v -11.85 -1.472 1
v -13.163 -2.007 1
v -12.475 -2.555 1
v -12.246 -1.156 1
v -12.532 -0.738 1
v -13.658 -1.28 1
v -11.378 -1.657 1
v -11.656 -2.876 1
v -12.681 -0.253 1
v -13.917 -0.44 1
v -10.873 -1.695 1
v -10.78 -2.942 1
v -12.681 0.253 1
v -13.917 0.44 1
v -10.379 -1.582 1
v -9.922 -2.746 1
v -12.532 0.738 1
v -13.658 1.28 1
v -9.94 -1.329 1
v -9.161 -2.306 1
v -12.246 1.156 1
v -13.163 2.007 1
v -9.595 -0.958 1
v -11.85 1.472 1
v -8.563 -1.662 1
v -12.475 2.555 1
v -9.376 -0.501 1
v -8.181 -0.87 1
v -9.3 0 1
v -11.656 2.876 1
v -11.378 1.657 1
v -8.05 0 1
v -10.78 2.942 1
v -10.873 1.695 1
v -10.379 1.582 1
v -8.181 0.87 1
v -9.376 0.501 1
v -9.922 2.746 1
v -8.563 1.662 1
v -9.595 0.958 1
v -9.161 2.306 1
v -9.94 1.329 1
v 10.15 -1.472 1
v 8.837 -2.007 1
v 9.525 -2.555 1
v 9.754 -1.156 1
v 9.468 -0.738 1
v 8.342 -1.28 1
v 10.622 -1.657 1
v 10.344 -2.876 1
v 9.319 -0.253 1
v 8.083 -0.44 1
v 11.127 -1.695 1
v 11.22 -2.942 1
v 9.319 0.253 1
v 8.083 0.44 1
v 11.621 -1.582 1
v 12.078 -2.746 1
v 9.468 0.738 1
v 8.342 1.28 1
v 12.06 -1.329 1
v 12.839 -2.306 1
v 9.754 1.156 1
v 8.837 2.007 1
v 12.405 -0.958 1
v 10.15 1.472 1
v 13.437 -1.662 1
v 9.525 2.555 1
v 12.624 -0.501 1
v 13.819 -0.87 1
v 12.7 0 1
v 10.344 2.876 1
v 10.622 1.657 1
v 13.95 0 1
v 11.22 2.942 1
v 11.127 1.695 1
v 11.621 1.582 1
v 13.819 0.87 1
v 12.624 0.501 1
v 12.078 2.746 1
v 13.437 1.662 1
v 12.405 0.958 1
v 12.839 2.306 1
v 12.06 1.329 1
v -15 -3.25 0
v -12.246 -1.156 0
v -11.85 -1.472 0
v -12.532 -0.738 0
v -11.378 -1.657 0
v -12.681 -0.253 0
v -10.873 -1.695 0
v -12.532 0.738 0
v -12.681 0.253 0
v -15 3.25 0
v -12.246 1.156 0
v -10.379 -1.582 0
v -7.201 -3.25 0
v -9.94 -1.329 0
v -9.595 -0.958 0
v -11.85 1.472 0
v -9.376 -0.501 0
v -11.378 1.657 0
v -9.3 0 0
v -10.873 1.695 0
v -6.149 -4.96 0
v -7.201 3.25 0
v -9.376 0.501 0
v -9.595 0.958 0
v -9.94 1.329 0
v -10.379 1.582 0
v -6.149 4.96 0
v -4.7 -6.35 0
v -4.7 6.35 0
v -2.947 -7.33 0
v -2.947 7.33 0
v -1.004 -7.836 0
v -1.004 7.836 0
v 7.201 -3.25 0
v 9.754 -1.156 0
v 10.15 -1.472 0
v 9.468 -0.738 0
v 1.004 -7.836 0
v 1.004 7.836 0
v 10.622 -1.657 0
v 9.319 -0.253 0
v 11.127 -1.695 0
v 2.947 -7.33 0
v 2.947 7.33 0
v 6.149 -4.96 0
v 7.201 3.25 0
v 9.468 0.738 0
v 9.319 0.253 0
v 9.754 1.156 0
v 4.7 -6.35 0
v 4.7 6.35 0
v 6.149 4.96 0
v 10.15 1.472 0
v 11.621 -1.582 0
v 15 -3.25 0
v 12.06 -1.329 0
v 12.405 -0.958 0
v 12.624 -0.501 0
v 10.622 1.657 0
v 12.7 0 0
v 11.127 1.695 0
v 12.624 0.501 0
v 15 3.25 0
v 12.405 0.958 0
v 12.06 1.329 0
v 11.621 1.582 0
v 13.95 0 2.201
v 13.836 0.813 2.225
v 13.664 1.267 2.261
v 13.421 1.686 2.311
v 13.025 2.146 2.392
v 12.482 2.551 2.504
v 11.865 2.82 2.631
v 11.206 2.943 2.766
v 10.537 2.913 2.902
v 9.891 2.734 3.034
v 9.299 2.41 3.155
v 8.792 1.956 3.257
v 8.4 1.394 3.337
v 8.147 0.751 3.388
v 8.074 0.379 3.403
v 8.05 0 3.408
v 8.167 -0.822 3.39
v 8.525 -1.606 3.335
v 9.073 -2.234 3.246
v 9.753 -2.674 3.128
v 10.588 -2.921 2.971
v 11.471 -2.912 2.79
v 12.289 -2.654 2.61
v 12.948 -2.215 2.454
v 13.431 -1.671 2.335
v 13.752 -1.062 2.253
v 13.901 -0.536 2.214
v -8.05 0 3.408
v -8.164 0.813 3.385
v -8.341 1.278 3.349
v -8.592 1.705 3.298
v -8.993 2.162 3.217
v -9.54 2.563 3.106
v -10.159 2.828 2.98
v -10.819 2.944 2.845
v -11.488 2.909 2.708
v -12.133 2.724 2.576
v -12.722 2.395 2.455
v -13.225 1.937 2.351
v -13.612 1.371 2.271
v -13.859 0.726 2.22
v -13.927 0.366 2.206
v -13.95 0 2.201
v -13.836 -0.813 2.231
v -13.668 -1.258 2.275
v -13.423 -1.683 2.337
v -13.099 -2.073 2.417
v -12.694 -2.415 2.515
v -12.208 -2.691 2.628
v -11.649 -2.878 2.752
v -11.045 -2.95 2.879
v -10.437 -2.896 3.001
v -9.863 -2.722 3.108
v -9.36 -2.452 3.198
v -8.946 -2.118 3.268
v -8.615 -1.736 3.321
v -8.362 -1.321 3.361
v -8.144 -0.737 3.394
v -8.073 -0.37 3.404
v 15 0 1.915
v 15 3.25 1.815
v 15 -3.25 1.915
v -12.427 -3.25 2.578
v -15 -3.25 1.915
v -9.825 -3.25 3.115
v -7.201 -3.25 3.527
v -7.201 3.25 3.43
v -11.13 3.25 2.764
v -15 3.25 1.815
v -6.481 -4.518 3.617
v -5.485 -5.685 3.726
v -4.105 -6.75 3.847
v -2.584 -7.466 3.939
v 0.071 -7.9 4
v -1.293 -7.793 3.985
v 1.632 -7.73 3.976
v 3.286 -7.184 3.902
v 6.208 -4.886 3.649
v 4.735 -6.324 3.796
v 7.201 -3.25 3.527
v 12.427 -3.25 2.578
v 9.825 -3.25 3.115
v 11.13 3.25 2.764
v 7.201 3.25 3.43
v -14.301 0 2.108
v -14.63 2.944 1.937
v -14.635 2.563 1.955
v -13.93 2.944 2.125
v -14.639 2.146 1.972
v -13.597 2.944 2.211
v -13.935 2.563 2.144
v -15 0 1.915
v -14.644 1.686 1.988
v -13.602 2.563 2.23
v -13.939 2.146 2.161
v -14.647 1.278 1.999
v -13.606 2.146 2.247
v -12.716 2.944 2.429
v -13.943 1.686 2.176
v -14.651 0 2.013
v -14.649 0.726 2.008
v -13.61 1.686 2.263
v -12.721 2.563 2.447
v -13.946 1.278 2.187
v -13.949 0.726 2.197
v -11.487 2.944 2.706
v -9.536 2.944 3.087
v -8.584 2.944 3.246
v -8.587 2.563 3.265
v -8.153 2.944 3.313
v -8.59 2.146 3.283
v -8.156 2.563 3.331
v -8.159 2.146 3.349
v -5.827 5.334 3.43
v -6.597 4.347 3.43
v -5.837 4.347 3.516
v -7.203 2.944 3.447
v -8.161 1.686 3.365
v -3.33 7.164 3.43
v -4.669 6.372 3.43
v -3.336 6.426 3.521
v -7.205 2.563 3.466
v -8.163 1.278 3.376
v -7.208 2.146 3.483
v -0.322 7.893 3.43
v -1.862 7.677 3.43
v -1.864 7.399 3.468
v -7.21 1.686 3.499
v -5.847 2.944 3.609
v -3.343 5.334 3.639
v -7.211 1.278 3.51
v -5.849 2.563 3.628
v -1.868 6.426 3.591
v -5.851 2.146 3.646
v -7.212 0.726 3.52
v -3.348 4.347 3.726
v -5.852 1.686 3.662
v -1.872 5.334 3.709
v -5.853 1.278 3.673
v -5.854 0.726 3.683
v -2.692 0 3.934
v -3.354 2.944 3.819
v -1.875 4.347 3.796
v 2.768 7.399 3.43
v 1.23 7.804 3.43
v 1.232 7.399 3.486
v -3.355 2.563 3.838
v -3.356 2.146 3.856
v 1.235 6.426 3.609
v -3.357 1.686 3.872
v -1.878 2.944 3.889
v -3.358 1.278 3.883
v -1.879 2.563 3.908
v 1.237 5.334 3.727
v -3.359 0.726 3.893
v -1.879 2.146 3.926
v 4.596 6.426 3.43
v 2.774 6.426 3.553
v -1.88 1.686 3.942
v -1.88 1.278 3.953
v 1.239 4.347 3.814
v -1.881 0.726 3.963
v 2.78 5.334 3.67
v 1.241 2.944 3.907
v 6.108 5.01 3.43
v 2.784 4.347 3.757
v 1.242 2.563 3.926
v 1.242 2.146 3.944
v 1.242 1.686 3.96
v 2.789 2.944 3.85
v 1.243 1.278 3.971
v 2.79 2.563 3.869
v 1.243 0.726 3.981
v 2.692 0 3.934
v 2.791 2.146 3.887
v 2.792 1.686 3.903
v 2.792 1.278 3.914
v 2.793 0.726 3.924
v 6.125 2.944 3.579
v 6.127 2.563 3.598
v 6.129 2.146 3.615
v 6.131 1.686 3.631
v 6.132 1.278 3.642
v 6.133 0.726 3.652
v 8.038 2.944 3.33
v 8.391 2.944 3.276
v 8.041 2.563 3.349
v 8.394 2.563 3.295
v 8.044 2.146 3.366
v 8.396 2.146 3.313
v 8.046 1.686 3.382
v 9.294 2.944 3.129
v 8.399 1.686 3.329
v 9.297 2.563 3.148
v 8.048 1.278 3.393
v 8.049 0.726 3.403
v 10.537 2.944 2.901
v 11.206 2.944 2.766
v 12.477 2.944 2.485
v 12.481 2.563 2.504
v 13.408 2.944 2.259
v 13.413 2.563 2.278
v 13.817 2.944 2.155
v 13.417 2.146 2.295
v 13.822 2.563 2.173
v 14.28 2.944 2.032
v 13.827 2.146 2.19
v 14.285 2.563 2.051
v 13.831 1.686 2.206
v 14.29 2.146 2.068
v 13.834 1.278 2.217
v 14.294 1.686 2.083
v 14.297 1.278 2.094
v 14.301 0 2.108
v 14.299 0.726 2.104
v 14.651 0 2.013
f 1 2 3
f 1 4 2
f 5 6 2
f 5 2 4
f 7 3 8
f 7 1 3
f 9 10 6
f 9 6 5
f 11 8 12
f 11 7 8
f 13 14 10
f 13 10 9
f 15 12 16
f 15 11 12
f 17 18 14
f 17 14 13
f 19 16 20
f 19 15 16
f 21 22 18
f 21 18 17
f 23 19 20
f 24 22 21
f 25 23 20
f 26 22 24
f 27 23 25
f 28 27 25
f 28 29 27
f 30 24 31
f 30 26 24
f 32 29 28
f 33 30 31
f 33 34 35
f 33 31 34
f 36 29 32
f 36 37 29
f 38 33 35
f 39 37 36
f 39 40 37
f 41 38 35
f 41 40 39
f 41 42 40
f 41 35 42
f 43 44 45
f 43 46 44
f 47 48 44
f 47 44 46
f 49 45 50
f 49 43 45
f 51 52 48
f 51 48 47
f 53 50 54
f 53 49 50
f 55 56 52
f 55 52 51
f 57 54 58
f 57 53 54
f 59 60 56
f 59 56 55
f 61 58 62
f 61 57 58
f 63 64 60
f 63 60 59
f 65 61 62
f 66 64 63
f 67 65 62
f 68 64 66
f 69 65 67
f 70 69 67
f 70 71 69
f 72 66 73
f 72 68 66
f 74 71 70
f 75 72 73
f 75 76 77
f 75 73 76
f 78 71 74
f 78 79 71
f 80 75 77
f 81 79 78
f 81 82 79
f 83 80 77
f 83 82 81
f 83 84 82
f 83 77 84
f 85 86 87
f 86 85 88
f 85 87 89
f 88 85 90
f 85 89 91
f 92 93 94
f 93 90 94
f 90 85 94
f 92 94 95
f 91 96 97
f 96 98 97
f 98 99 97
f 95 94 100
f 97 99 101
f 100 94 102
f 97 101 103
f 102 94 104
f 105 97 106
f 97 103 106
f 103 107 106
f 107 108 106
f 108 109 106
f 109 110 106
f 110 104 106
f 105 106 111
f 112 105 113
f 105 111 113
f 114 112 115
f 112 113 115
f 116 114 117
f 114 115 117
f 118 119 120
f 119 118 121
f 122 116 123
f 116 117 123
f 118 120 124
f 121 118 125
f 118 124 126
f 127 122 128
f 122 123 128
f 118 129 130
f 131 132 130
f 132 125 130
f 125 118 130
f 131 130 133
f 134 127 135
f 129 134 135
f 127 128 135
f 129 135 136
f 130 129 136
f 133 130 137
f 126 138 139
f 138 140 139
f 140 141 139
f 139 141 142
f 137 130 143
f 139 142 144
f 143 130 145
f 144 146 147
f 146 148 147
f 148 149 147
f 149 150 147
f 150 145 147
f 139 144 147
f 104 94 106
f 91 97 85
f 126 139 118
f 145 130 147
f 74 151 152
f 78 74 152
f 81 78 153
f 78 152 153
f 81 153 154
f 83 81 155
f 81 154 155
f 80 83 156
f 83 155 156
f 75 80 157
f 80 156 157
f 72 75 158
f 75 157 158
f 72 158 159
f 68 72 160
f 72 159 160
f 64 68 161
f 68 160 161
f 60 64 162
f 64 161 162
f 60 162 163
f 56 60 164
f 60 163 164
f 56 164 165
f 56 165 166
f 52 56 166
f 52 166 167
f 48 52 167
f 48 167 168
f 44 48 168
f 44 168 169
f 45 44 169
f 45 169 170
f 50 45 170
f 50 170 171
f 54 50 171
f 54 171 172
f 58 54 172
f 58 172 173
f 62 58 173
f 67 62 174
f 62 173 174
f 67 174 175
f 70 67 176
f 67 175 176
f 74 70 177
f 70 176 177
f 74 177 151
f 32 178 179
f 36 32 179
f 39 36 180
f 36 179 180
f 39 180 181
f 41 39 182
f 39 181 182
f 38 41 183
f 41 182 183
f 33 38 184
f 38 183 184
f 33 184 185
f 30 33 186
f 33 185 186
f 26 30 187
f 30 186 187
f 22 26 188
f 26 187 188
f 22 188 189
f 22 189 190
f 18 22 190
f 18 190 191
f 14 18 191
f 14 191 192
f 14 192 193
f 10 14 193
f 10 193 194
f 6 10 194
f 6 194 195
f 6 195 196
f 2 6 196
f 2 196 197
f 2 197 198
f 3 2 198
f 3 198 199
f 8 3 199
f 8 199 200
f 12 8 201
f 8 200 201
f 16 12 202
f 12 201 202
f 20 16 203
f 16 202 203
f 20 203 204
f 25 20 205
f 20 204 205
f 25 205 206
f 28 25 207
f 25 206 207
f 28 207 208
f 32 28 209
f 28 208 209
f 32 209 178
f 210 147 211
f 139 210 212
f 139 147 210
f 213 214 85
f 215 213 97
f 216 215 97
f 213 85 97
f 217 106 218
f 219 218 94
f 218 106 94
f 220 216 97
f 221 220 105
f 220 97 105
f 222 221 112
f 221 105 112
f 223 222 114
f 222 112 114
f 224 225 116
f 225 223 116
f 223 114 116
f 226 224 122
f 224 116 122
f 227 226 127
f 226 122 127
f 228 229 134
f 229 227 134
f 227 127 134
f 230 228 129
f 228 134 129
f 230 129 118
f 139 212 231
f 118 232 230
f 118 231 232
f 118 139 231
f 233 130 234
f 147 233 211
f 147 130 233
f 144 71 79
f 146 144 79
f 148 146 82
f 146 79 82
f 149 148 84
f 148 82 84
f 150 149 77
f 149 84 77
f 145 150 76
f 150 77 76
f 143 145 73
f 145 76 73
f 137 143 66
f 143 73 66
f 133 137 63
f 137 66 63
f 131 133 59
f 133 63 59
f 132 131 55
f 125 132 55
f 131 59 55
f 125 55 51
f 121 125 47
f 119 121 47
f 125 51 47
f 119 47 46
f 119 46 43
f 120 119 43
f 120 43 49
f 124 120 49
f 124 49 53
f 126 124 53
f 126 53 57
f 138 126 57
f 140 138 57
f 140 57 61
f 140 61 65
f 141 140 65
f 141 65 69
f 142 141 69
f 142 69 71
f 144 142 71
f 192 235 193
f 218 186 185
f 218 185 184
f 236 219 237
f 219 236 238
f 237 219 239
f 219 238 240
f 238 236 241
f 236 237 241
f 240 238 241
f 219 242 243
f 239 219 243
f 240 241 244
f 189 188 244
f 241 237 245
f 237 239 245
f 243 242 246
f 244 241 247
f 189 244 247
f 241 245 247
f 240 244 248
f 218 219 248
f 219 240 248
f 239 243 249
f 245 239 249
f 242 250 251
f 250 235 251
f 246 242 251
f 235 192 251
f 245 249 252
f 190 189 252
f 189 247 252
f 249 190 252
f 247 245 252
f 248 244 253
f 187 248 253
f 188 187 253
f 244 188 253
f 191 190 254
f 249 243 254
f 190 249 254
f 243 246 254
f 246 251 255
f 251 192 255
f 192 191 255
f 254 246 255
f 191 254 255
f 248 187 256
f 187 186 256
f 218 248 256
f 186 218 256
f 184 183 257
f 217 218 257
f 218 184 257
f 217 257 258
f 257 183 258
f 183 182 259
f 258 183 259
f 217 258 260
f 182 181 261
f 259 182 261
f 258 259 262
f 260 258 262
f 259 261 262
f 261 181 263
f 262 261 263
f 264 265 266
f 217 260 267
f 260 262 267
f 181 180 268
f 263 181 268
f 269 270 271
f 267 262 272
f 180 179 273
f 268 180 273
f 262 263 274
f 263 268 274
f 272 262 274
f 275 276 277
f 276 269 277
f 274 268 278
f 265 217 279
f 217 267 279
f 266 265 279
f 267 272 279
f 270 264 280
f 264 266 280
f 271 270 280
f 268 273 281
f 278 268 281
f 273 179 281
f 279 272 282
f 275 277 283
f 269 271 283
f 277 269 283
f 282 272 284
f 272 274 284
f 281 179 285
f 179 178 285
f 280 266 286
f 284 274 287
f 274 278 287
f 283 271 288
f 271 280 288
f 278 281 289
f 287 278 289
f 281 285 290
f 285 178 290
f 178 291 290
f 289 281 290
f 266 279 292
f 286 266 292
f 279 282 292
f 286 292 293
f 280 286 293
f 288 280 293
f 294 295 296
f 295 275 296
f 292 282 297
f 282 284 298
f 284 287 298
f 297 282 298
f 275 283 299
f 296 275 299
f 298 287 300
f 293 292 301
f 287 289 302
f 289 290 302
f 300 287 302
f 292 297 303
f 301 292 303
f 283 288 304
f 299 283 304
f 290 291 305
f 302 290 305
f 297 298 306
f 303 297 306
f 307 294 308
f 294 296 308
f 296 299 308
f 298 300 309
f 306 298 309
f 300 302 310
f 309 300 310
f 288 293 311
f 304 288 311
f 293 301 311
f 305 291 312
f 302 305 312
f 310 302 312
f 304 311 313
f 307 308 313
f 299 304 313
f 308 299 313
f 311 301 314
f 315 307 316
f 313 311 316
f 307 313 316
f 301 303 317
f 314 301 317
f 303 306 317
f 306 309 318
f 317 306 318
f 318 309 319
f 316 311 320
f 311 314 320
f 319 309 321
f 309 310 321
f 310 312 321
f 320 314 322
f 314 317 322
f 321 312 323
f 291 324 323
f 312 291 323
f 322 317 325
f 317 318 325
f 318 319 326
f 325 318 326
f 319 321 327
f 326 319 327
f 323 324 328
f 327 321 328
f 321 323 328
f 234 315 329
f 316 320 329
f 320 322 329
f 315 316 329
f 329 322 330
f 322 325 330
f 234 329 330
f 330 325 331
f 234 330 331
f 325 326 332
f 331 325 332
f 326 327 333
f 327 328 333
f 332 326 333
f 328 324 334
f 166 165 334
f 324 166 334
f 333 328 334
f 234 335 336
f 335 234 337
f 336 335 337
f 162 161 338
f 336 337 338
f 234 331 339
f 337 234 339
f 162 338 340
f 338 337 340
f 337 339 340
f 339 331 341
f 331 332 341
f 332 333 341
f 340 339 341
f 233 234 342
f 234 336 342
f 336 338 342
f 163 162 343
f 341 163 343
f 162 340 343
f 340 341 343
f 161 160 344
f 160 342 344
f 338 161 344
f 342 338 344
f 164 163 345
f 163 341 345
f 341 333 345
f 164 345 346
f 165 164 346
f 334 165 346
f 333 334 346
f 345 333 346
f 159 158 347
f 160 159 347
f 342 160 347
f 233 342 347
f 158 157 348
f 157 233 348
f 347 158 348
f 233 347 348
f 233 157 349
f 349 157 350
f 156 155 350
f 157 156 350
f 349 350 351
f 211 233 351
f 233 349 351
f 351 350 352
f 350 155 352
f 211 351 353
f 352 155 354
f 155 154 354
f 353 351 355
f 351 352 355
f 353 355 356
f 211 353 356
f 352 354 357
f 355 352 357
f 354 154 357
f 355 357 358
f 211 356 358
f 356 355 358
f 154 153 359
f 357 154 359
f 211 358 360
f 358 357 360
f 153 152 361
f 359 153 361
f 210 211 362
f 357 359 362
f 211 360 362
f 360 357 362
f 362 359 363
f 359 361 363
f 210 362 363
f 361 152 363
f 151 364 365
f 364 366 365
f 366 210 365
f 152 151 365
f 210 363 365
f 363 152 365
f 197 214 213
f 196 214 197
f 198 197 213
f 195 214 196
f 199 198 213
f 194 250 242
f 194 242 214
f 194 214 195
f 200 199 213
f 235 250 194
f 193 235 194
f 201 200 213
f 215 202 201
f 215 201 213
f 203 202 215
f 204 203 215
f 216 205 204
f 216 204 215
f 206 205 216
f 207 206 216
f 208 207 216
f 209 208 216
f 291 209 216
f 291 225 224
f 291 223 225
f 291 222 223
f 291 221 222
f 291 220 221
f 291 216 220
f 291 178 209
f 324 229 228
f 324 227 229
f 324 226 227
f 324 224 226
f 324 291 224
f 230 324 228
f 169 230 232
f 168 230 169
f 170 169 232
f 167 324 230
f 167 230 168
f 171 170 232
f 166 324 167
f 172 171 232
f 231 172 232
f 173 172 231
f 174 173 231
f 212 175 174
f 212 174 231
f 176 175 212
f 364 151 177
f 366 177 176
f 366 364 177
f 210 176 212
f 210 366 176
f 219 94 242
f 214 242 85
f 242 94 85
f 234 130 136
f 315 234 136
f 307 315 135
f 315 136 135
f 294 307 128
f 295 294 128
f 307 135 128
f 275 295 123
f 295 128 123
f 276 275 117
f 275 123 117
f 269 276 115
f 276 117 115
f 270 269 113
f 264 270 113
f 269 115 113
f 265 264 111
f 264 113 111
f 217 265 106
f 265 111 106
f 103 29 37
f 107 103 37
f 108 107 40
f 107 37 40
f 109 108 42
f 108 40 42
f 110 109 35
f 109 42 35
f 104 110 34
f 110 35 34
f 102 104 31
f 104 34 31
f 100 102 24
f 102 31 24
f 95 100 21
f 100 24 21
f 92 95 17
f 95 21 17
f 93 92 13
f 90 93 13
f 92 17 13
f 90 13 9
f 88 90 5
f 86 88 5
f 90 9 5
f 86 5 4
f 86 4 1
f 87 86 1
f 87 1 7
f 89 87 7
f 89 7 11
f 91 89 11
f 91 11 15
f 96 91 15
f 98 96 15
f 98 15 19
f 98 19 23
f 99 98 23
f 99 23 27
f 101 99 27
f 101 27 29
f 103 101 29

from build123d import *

# Parameters (mm, degrees)
PAD_DEPTH       = 4
SKETCH001_R     = 1.7
POCKET_DEPTH    = 4.001
SKETCH002_R     = 2.95
POCKET001_DEPTH = 3


with BuildPart() as part:
    # Sketch → Pad (new body)
    with BuildSketch(Plane.XY):
        with BuildLine():
            Line((-7.200521, 3.25), (-15, 3.25))
            Line((-15, 3.25), (-15, -3.25))
            Line((-15, -3.25), (-7.200521, -3.25))
            ThreePointArc((-7.200521, -3.25), (0, -7.9), (7.200521, -3.25))
            Line((15, -3.25), (7.200521, -3.25))
            Line((15, 3.25), (15, -3.25))
            Line((7.200521, 3.25), (15, 3.25))
            ThreePointArc((7.200521, 3.25), (0, 7.9), (-7.200521, 3.25))
        make_face()
    extrude(amount=PAD_DEPTH)

    # Sketch001 (on Face10 of Pad) → Pocket (cut, through all)
    with BuildSketch(Plane.XY.offset(4)):
        with Locations((11, 0)):
            Circle(SKETCH001_R)
        with Locations((-11, 0)):
            Circle(SKETCH001_R)
    extrude(amount=-POCKET_DEPTH, mode=Mode.SUBTRACT)

    # Sketch002 (on Face5 of Pocket) → Pocket001 (cut)
    with BuildSketch(Plane.XY.offset(4)):
        with Locations((-11, 0)):
            Circle(SKETCH002_R)
        with Locations((11, 0)):
            Circle(SKETCH002_R)
    extrude(amount=-POCKET001_DEPTH, mode=Mode.SUBTRACT)

    # Sketch003 → Groove (revolve, cut)
    with BuildSketch(Plane.YZ):
        with BuildLine():
            ThreePointArc((10, 3.083269), (5.020966, 3.770338), (0, 4))
            Line((-10, 4), (0, 4))
            Line((-10, 7), (-10, 4))
            Line((10, 7), (-10, 7))
            Line((10, 7), (10, 3.083269))
        make_face()
    revolve(axis=Axis((0, 0, -51), (0, 1, 0)), mode=Mode.SUBTRACT)


solid = part.part
